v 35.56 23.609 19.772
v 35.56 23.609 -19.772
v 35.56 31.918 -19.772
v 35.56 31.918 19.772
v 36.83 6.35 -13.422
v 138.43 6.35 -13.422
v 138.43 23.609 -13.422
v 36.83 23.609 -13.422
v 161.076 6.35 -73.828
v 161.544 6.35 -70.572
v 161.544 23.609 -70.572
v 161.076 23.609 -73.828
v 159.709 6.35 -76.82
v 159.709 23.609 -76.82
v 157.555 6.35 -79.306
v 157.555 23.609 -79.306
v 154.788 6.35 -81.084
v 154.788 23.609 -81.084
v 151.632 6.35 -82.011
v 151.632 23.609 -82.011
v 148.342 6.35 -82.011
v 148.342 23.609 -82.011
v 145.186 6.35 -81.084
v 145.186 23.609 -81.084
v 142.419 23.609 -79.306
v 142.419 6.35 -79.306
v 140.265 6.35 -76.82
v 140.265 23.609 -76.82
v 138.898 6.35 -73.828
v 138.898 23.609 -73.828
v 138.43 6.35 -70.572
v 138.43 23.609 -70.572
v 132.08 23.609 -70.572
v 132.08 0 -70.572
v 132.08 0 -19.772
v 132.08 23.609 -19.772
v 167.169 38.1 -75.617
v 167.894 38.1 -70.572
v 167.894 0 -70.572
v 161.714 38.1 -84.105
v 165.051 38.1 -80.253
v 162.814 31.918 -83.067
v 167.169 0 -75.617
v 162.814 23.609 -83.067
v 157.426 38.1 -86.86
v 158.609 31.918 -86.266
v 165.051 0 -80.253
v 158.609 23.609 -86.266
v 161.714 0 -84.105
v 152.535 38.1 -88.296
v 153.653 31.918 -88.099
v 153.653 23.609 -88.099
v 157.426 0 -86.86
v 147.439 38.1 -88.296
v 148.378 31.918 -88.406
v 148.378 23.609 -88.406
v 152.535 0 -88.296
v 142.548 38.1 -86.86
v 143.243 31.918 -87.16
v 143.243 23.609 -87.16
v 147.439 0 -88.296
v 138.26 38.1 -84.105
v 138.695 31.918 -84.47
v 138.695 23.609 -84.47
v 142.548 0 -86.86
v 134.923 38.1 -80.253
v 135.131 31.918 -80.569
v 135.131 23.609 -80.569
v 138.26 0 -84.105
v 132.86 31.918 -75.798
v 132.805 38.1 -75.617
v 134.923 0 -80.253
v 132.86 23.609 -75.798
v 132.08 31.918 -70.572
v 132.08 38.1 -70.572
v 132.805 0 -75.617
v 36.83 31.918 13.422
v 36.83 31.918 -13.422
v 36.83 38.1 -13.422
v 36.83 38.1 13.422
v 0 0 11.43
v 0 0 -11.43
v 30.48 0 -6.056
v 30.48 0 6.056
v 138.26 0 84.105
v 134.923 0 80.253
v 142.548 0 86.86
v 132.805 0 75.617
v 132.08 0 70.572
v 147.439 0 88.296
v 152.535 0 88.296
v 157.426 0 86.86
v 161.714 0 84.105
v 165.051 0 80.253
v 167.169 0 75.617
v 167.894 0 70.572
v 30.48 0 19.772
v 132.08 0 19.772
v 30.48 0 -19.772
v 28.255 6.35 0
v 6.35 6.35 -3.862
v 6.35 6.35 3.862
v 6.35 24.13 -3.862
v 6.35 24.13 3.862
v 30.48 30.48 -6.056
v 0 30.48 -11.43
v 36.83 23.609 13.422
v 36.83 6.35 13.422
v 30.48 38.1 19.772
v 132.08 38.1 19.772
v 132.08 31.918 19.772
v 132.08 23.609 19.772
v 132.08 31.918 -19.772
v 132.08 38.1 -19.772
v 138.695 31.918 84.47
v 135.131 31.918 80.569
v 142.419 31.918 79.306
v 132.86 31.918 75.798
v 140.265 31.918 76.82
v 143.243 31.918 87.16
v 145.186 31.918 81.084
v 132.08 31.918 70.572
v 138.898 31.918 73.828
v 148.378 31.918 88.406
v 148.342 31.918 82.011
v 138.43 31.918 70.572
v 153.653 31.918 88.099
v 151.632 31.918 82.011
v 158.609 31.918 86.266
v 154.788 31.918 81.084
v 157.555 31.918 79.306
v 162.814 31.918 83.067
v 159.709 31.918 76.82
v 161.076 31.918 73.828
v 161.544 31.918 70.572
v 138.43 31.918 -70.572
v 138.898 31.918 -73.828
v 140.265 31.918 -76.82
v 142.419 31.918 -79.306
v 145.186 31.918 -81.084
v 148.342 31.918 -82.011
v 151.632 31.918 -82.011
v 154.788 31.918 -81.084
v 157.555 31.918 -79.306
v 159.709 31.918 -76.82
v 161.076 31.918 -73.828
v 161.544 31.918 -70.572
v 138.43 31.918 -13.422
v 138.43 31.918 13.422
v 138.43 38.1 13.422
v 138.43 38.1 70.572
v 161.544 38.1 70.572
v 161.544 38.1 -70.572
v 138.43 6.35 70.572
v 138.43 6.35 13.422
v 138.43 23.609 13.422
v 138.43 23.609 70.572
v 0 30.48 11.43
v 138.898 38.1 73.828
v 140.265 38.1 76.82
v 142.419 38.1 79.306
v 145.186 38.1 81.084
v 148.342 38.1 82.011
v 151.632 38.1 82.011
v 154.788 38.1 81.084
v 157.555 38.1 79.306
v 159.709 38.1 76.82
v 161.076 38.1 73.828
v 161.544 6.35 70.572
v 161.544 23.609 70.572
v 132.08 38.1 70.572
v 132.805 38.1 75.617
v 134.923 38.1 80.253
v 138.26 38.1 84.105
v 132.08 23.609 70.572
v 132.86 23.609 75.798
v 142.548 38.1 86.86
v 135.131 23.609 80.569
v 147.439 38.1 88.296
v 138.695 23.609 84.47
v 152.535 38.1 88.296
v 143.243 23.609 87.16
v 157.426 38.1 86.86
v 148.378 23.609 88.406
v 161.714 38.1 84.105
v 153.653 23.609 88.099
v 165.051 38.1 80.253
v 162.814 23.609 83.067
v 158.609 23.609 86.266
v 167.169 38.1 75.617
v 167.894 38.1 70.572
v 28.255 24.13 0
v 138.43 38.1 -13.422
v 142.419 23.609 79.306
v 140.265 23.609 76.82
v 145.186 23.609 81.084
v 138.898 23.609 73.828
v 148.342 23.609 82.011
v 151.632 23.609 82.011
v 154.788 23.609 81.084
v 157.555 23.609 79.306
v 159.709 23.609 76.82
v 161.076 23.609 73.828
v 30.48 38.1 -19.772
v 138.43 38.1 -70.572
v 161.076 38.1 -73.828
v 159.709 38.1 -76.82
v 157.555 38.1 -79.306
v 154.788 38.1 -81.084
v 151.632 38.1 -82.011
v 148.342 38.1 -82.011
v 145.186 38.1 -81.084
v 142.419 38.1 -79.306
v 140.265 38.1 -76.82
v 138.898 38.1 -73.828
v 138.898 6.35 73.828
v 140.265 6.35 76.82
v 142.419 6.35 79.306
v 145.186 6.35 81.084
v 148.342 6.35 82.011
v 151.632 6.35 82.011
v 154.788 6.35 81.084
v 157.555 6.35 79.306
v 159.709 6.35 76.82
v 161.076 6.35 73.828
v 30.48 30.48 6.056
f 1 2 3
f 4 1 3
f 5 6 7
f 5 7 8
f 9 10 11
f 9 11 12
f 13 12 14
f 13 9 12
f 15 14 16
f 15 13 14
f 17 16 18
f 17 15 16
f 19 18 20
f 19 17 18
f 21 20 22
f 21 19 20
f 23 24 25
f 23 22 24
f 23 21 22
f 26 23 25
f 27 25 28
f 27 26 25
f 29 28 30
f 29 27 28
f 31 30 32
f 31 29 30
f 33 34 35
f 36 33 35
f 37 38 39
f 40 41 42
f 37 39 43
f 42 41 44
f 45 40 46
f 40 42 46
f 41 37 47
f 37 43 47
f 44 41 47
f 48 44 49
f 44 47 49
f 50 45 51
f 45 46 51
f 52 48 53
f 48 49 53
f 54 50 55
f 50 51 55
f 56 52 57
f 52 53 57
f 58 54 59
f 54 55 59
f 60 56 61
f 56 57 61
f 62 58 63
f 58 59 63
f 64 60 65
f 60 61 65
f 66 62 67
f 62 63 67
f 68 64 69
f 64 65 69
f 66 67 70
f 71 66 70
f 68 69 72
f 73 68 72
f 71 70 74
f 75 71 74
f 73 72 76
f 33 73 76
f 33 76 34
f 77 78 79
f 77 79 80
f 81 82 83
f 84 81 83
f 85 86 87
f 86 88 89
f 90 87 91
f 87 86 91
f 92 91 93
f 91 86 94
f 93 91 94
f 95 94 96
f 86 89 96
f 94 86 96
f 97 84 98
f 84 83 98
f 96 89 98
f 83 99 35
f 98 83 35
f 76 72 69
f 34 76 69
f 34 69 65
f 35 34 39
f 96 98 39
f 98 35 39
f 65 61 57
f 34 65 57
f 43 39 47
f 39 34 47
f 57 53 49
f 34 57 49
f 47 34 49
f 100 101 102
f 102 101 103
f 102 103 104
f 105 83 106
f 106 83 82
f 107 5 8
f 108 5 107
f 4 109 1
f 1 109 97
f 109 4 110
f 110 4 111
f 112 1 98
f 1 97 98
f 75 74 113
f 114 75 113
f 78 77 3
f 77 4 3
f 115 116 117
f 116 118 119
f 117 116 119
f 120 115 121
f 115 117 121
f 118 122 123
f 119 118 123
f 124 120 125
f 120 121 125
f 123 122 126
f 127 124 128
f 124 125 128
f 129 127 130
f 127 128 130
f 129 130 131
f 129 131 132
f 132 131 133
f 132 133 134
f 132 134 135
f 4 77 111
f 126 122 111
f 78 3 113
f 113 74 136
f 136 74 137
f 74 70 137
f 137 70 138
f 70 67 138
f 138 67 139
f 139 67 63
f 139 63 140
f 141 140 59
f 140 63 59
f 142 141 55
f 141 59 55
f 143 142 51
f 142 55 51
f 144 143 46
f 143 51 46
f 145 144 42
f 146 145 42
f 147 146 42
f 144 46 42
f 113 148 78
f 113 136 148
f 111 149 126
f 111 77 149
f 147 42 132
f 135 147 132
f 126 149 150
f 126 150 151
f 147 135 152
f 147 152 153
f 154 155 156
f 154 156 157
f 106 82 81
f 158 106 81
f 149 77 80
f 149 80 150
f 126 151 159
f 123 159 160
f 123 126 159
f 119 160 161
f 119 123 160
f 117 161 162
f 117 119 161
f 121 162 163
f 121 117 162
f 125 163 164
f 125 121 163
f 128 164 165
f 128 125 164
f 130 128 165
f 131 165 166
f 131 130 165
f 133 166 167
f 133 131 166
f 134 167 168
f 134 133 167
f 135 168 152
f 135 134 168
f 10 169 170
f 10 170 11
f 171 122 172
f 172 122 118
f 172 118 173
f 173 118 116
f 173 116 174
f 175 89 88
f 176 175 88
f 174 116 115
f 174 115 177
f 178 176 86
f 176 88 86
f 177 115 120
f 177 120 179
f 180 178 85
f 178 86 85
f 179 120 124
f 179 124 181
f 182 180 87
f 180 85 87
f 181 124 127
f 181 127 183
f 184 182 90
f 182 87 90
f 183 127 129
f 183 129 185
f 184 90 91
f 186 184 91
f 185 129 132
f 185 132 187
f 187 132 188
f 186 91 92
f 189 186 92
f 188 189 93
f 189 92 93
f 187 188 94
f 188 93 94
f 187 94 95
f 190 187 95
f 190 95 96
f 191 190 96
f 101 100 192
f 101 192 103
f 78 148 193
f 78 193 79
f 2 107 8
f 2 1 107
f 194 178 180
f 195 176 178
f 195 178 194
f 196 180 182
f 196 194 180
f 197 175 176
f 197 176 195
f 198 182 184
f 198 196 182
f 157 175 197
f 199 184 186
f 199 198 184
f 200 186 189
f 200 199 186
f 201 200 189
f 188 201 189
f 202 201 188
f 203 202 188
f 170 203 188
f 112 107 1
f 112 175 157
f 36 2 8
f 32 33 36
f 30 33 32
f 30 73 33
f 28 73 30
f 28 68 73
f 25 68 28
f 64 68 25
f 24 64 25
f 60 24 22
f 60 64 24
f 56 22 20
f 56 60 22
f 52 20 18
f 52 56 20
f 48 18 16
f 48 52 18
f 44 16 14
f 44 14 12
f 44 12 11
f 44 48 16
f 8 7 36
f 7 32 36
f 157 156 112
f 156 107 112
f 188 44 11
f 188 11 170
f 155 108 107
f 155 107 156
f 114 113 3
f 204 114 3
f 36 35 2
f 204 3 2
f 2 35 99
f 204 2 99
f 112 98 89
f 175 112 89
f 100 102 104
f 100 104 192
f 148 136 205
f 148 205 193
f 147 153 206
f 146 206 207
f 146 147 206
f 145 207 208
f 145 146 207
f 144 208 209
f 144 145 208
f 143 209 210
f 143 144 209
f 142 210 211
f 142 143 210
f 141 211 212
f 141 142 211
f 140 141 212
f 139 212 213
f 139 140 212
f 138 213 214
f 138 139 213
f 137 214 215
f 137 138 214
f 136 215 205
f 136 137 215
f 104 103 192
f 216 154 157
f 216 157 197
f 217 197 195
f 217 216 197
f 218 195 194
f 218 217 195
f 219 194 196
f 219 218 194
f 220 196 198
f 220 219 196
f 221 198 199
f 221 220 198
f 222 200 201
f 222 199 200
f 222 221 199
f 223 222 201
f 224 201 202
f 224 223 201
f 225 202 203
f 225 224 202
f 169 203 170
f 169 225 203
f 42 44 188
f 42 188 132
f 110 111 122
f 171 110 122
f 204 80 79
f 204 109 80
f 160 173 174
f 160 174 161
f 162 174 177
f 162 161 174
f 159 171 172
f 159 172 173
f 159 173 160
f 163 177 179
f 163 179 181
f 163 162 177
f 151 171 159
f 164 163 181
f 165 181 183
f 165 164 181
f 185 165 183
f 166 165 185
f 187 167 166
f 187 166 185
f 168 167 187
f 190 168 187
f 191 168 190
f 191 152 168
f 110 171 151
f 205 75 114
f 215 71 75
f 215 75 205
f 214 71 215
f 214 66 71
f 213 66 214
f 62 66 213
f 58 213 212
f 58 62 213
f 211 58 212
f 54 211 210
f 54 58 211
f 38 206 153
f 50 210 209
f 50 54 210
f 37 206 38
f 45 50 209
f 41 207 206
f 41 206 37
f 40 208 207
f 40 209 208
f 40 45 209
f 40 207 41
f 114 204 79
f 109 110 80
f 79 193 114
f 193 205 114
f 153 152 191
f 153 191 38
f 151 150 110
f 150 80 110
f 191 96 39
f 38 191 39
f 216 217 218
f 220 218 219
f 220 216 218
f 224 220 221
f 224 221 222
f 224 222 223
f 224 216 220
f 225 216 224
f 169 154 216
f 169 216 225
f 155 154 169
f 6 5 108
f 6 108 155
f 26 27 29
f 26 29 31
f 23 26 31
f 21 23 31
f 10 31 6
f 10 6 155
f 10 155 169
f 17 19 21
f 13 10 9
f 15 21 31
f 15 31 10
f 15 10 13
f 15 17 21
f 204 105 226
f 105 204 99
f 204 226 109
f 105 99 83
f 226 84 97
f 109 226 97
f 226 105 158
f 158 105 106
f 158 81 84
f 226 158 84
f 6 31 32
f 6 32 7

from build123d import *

# Parameters (mm, degrees)
BOSS_EXTRUDE1_DEPTH      = 38.1
CUT_EXTRUDE10_DEPTH      = 7.62
SHELL2_START             = 6.35
SHELL2_DEPTH             = 31.75
SHELL2_2_DEPTH           = 17.78
CUT_EXTRUDE11_DEPTH      = 204.366887563
CUT_EXTRUDE11_DEPTH_BACK = 204.366887563
SKETCH6_W                = 127.254
SKETCH6_H                = 8.308241082


# Read off the part's stored shape, not the designer's step: Shell2
with BuildPart() as part:
    # Sketch1 → Boss-Extrude1 (new body)
    with BuildSketch(Plane(origin=(0, 0, 0), x_dir=(1, 0, 0), z_dir=(0, 1, 0))):
        with BuildLine():
            Line((0, 11.43), (0, -11.43))
            Line((0, -11.43), (30.48, -6.055553628))
            Line((30.48, -6.055553628), (30.48, -19.771553628))
            Line((30.48, -19.771553628), (132.08, -19.771553628))
            Line((132.08, -19.771553628), (132.08, -70.571553628))
            ThreePointArc((132.08, -70.571553628), (149.987, -88.478553628), (167.894, -70.571553628))
            Line((167.894, -70.571553628), (167.894, 70.571553628))
            ThreePointArc((167.894, 70.571553628), (149.987, 88.478553628), (132.08, 70.571553628))
            Line((132.08, 70.571553628), (132.08, 19.771553628))
            Line((132.08, 19.771553628), (30.48, 19.771553628))
            Line((30.48, 19.771553628), (30.48, 6.055553628))
            Line((30.48, 6.055553628), (0, 11.43))
        make_face()
    extrude(amount=BOSS_EXTRUDE1_DEPTH)

    # Sketch5 → Cut-Extrude10 (cut)
    with BuildSketch(Plane(origin=(0, 38.1, 0), x_dir=(1, 0, 0), z_dir=(0, 1, 0))):
        Polygon((0, -11.43), (0, 11.43), (0.205611809, 11.576348711), (30.48, 6.055553628), (30.48, -6.055553628), align=None)
    extrude(amount=-CUT_EXTRUDE10_DEPTH, mode=Mode.SUBTRACT)

    # Shell2 outline → Shell2 (cut)
    with BuildSketch(Plane(origin=(0, 0, 0), x_dir=(1, 0, 0), z_dir=(0, 1, 0)).offset(SHELL2_START)):
        with BuildLine():
            Line((36.83, 13.421553628), (36.83, -13.421553628))
            Line((36.83, -13.421553628), (138.43, -13.421553628))
            Line((138.43, -13.421553628), (138.43, -70.571553628))
            ThreePointArc((138.43, -70.571553628), (149.987, -82.128553628), (161.544, -70.571553628))
            Line((161.544, -70.571553628), (161.544, 70.571553628))
            ThreePointArc((161.544, 70.571553628), (149.987, 82.128553628), (138.43, 70.571553628))
            Line((138.43, 70.571553628), (138.43, 13.421553628))
            Line((138.43, 13.421553628), (36.83, 13.421553628))
        make_face()
    extrude(amount=SHELL2_DEPTH, mode=Mode.SUBTRACT)

    # Shell2 2 outline → Shell2 2 (cut)
    with BuildSketch(Plane(origin=(0, 0, 0), x_dir=(1, 0, 0), z_dir=(0, 1, 0)).offset(SHELL2_START)):
        Polygon((28.25455863, 0), (6.35, 3.862364687), (6.35, -3.862364687), align=None)
    extrude(amount=SHELL2_2_DEPTH, mode=Mode.SUBTRACT)

    # Sketch6 → Cut-Extrude11 (cut, two sides: drawn at the far end of the back side and taken through both)
    with BuildSketch(Plane.XY.offset(19.771553628).offset(-CUT_EXTRUDE11_DEPTH_BACK)):
        with Locations((99.187, 27.763521135)):
            Rectangle(SKETCH6_W, SKETCH6_H)
    extrude(amount=CUT_EXTRUDE11_DEPTH + CUT_EXTRUDE11_DEPTH_BACK, mode=Mode.SUBTRACT)


solid = part.part
